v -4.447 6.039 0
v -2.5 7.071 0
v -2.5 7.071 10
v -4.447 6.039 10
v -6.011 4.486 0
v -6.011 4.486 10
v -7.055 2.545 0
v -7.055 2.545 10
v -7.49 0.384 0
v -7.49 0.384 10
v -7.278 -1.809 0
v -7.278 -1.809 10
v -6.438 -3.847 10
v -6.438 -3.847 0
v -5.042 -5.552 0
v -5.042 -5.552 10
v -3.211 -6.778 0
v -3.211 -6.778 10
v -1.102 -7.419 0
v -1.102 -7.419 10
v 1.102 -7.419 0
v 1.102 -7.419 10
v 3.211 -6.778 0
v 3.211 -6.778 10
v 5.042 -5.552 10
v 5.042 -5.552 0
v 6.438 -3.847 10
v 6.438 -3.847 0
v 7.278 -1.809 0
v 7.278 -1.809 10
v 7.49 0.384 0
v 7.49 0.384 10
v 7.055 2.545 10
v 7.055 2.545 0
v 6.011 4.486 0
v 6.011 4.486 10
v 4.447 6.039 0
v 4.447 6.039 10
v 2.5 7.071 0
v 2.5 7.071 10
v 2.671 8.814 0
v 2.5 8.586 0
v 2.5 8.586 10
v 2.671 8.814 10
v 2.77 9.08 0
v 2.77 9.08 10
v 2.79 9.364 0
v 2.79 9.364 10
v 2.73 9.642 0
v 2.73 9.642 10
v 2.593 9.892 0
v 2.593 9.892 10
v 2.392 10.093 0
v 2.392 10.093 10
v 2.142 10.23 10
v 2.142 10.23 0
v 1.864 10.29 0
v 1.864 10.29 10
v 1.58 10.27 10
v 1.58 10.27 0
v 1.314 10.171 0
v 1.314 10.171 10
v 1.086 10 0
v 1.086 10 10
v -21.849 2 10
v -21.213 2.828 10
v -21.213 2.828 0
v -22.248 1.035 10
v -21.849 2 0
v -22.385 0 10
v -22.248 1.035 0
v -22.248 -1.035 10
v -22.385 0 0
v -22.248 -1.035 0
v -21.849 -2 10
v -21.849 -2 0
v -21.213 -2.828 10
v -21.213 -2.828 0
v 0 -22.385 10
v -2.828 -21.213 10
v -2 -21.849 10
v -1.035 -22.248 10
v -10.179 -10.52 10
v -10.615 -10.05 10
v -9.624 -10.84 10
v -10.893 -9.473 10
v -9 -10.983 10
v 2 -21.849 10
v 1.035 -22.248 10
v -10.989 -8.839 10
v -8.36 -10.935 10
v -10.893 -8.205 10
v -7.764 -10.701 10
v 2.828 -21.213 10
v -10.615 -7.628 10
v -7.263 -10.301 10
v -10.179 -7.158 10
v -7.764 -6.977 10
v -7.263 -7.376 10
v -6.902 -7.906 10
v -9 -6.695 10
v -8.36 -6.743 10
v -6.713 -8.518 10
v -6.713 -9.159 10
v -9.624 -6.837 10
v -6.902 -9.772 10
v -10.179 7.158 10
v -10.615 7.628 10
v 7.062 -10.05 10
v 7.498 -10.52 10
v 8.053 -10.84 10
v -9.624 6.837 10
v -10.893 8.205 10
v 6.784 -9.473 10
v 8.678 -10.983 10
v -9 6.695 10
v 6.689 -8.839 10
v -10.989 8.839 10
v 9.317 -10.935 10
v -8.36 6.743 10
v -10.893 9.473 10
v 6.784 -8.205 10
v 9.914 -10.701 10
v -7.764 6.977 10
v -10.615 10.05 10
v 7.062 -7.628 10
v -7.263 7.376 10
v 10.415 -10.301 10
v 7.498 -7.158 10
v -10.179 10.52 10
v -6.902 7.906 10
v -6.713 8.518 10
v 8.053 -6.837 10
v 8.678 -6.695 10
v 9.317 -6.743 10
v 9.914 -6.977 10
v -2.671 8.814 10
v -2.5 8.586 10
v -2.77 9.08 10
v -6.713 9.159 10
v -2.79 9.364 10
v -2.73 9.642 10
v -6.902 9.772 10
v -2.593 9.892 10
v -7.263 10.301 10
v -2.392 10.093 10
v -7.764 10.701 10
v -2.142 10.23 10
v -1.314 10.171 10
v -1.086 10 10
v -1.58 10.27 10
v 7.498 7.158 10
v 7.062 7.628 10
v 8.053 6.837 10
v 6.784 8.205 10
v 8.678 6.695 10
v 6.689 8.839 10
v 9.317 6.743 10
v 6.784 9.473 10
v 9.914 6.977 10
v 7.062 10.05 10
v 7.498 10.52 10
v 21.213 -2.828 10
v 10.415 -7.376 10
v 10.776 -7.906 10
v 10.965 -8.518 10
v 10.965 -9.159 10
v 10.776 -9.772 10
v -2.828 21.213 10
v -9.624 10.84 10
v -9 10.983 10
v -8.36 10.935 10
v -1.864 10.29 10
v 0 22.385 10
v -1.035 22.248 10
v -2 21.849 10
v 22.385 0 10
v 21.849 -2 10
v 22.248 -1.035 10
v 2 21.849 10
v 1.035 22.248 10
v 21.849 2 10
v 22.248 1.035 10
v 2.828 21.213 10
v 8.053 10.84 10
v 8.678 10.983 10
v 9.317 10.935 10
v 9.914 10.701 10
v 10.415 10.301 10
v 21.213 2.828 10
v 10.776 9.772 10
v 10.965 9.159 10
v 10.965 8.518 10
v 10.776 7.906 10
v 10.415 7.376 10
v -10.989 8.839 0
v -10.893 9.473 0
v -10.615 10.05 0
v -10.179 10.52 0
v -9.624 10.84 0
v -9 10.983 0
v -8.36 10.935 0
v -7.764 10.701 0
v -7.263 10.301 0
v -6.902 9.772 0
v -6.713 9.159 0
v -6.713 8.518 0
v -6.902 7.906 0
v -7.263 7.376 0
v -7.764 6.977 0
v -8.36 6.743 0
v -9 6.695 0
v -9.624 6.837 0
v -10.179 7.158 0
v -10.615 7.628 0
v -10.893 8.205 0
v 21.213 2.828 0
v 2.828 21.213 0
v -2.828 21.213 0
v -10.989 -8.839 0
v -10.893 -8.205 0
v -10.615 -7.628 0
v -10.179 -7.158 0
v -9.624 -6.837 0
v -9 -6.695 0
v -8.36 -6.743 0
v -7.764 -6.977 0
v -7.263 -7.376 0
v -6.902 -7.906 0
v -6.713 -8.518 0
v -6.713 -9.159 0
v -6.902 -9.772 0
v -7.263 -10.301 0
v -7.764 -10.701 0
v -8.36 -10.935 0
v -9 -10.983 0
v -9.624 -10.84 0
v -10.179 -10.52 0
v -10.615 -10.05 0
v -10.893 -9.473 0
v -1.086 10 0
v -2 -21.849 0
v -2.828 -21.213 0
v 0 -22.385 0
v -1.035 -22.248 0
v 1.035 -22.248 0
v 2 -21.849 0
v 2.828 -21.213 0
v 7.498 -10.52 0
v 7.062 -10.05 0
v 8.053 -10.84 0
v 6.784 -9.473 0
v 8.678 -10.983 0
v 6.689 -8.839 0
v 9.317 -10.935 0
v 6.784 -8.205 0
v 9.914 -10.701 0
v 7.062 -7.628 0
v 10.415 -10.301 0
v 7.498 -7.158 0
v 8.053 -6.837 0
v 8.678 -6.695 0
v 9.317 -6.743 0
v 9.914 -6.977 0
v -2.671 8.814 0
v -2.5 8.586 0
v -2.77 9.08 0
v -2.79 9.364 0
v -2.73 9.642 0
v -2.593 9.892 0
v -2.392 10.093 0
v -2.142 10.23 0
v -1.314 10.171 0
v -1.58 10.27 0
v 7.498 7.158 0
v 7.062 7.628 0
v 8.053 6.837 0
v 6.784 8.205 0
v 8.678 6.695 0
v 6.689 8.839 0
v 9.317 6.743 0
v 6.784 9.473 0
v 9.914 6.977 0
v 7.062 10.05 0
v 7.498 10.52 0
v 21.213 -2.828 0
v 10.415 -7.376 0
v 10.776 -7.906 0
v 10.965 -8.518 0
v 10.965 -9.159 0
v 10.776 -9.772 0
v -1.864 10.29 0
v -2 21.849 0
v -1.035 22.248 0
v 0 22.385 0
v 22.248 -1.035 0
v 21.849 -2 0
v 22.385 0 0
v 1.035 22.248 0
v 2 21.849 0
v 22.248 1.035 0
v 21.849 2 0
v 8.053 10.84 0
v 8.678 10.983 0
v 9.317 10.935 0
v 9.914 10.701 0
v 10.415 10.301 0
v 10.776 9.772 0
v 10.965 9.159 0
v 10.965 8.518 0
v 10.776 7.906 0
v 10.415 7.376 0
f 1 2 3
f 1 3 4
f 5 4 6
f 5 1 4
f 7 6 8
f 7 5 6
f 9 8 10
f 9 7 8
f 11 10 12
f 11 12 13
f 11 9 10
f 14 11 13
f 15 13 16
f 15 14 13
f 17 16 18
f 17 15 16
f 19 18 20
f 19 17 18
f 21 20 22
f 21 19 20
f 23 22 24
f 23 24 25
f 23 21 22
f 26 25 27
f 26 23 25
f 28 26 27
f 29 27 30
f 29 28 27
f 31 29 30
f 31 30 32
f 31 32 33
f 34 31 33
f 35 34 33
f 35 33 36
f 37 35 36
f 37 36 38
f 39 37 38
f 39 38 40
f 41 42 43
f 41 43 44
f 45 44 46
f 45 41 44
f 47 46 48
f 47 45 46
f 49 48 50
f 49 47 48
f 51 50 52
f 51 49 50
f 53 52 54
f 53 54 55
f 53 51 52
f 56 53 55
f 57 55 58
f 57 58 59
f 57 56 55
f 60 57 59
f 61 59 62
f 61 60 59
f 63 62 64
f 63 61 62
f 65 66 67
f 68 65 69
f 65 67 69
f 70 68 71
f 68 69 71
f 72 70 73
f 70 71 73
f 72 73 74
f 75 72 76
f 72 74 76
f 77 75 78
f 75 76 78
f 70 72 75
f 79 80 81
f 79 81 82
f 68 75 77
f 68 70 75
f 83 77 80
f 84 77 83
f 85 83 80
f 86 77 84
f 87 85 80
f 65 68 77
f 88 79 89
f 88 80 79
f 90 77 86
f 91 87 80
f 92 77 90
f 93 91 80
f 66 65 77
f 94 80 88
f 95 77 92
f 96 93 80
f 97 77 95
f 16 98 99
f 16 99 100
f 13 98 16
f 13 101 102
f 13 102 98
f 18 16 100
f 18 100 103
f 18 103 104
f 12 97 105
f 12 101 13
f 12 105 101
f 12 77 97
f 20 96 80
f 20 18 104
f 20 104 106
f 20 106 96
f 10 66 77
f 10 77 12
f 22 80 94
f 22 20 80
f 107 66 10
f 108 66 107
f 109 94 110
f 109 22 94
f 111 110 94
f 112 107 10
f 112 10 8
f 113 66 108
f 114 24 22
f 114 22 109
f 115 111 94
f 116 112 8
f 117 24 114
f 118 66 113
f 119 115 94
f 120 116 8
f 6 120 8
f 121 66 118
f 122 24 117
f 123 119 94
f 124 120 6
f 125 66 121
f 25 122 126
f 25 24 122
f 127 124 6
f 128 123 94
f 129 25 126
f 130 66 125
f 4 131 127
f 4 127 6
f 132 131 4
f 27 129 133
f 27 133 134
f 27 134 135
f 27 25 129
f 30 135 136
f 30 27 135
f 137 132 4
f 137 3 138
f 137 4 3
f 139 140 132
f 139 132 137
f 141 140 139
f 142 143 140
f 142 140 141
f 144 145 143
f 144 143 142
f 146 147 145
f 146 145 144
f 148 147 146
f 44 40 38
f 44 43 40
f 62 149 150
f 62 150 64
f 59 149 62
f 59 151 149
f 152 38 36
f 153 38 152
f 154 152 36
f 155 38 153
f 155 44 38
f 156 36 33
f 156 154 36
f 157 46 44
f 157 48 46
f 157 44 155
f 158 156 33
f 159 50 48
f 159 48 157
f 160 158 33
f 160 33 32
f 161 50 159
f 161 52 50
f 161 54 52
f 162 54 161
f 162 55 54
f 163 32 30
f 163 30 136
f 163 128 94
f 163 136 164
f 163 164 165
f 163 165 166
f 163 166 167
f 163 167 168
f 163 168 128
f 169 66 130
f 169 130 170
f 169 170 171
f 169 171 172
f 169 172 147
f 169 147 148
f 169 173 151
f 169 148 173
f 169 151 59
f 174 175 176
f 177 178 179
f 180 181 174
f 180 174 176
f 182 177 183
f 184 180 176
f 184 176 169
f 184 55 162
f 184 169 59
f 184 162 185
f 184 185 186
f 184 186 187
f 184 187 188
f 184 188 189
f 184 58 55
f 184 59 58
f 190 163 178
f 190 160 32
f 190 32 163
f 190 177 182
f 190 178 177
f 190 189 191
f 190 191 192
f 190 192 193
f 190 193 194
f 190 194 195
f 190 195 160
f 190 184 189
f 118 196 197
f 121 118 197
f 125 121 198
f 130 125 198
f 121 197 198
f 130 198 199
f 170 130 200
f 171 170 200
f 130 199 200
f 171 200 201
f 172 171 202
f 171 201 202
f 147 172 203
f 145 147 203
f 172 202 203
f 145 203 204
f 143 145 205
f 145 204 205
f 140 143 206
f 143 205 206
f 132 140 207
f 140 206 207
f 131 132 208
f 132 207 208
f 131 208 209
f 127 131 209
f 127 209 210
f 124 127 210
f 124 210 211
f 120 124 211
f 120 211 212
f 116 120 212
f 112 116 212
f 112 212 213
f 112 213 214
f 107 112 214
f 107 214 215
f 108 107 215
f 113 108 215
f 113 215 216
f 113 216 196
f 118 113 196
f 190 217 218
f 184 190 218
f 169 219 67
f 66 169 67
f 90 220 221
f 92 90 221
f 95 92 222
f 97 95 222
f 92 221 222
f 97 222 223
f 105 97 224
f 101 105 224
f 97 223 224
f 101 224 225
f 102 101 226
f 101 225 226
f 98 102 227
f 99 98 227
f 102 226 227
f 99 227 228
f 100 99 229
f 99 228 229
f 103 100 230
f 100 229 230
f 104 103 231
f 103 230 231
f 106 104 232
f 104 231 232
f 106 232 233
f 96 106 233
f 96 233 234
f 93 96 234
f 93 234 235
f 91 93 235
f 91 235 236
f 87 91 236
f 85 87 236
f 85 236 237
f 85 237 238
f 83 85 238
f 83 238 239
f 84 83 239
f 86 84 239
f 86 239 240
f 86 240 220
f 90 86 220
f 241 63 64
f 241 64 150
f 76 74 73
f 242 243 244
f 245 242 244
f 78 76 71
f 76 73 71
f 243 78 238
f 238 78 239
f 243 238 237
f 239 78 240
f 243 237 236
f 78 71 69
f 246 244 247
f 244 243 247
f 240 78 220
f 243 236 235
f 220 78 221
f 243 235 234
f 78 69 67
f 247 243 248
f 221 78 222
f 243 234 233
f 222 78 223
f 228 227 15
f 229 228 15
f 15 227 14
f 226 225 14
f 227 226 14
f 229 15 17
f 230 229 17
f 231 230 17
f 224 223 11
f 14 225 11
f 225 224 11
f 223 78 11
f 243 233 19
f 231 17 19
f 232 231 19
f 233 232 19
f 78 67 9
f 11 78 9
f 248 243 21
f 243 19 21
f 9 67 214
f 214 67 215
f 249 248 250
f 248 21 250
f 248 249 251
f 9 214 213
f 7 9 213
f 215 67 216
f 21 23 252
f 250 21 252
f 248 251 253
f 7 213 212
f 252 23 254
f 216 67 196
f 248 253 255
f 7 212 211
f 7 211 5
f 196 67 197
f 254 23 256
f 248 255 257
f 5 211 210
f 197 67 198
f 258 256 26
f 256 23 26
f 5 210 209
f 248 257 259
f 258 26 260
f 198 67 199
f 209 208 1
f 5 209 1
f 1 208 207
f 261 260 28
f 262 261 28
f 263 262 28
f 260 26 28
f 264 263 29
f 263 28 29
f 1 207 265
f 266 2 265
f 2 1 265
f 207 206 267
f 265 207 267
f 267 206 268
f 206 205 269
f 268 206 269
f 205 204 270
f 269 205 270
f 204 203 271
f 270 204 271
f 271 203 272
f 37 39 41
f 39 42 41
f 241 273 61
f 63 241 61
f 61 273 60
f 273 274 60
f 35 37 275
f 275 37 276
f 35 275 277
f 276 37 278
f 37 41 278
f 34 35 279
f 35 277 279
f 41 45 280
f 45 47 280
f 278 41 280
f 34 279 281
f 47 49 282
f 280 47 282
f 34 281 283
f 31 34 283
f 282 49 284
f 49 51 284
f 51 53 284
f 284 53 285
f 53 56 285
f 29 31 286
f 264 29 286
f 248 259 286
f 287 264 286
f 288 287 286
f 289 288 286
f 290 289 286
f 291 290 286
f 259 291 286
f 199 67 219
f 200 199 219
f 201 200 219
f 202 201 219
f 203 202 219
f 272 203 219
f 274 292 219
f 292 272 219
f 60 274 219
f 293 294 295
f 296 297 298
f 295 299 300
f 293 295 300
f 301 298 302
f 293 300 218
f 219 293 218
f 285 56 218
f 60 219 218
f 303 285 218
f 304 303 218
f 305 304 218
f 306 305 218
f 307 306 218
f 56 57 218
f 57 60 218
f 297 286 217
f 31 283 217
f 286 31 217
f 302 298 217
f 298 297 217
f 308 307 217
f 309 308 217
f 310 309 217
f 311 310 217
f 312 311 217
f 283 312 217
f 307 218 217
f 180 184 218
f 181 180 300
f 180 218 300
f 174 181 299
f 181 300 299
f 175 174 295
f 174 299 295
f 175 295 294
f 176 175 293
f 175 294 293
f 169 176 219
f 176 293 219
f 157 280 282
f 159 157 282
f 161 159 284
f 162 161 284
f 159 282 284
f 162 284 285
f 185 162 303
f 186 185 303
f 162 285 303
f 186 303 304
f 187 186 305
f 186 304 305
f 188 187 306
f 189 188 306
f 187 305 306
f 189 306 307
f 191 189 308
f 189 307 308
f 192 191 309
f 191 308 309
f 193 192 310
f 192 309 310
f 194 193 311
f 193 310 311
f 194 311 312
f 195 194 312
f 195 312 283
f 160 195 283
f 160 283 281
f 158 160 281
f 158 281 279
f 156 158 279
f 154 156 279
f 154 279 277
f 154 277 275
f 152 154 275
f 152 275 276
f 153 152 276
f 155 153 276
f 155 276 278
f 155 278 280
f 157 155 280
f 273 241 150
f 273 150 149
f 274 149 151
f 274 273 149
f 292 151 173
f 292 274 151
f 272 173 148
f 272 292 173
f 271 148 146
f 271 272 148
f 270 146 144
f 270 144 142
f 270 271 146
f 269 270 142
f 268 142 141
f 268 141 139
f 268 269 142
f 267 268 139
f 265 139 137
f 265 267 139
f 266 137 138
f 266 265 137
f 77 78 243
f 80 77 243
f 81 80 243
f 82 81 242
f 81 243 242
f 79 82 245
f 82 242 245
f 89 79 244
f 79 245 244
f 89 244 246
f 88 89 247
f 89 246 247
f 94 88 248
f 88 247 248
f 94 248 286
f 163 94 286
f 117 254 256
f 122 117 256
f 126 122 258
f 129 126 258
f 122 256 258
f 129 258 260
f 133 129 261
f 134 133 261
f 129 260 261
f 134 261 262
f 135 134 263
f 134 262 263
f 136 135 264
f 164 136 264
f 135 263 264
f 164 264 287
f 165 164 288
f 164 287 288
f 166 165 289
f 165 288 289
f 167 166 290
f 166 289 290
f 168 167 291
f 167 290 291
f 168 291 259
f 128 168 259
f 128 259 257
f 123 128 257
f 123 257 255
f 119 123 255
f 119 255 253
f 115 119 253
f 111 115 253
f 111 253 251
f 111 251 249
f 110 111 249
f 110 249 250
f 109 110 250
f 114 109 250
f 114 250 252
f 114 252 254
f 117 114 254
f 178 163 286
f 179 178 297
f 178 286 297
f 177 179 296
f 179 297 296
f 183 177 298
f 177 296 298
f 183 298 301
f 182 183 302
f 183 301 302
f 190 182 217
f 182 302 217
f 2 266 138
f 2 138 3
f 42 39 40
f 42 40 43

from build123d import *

# Parameters (mm, degrees)
EXTRUDE_1_DEPTH    = 10
HOLE_WIZARD_M4_1_D = 4.3


with BuildPart() as part:
    # ｽｹｯﾁ1 → ﾎﾞｽ - 押し出し1 (new body)
    with BuildSketch(Plane.XY):
        with BuildLine():
            Line((-21.213203436, -2.828427125), (-2.828427125, -21.213203436))
            ThreePointArc((-2.828427125, -21.213203436), (0, -22.384776311), (2.828427125, -21.213203436))
            Line((2.828427125, -21.213203436), (21.213203436, -2.828427125))
            ThreePointArc((21.213203436, -2.828427125), (22.384776311, 0), (21.213203436, 2.828427125))
            Line((21.213203436, 2.828427125), (2.828427125, 21.213203436))
            ThreePointArc((2.828427125, 21.213203436), (0, 22.384776311), (-2.828427125, 21.213203436))
            Line((-2.828427125, 21.213203436), (-21.213203436, 2.828427125))
            ThreePointArc((-21.213203436, 2.828427125), (-22.384776311, 0), (-21.213203436, -2.828427125))
        make_face()
        with BuildLine():
            Line((-2.5, 8.585786438), (-2.5, 7.071067812))
            ThreePointArc((-2.5, 7.071067812), (0, -7.5), (2.5, 7.071067812))
            Line((2.5, 7.071067812), (2.5, 8.585786438))
            ThreePointArc((2.5, 8.585786438), (2.5, 10), (1.085786438, 10))
            Line((1.085786438, 10), (-1.085786438, 10))
            ThreePointArc((-1.085786438, 10), (-2.5, 10), (-2.5, 8.585786438))
        make_face(mode=Mode.SUBTRACT)
    extrude(amount=EXTRUDE_1_DEPTH)

    # Hole Wizard M4 _1 (through all)
    with Locations(Plane(origin=(-8.838834765, 8.838834765, 10), x_dir=(1, 0, 0), z_dir=(0, 0, 1))):
        with Locations((0, 0), (17.67766953, 0), (17.67766953, -17.67766953), (0, -17.67766953)):
            Hole(HOLE_WIZARD_M4_1_D / 2)


solid = part.part
